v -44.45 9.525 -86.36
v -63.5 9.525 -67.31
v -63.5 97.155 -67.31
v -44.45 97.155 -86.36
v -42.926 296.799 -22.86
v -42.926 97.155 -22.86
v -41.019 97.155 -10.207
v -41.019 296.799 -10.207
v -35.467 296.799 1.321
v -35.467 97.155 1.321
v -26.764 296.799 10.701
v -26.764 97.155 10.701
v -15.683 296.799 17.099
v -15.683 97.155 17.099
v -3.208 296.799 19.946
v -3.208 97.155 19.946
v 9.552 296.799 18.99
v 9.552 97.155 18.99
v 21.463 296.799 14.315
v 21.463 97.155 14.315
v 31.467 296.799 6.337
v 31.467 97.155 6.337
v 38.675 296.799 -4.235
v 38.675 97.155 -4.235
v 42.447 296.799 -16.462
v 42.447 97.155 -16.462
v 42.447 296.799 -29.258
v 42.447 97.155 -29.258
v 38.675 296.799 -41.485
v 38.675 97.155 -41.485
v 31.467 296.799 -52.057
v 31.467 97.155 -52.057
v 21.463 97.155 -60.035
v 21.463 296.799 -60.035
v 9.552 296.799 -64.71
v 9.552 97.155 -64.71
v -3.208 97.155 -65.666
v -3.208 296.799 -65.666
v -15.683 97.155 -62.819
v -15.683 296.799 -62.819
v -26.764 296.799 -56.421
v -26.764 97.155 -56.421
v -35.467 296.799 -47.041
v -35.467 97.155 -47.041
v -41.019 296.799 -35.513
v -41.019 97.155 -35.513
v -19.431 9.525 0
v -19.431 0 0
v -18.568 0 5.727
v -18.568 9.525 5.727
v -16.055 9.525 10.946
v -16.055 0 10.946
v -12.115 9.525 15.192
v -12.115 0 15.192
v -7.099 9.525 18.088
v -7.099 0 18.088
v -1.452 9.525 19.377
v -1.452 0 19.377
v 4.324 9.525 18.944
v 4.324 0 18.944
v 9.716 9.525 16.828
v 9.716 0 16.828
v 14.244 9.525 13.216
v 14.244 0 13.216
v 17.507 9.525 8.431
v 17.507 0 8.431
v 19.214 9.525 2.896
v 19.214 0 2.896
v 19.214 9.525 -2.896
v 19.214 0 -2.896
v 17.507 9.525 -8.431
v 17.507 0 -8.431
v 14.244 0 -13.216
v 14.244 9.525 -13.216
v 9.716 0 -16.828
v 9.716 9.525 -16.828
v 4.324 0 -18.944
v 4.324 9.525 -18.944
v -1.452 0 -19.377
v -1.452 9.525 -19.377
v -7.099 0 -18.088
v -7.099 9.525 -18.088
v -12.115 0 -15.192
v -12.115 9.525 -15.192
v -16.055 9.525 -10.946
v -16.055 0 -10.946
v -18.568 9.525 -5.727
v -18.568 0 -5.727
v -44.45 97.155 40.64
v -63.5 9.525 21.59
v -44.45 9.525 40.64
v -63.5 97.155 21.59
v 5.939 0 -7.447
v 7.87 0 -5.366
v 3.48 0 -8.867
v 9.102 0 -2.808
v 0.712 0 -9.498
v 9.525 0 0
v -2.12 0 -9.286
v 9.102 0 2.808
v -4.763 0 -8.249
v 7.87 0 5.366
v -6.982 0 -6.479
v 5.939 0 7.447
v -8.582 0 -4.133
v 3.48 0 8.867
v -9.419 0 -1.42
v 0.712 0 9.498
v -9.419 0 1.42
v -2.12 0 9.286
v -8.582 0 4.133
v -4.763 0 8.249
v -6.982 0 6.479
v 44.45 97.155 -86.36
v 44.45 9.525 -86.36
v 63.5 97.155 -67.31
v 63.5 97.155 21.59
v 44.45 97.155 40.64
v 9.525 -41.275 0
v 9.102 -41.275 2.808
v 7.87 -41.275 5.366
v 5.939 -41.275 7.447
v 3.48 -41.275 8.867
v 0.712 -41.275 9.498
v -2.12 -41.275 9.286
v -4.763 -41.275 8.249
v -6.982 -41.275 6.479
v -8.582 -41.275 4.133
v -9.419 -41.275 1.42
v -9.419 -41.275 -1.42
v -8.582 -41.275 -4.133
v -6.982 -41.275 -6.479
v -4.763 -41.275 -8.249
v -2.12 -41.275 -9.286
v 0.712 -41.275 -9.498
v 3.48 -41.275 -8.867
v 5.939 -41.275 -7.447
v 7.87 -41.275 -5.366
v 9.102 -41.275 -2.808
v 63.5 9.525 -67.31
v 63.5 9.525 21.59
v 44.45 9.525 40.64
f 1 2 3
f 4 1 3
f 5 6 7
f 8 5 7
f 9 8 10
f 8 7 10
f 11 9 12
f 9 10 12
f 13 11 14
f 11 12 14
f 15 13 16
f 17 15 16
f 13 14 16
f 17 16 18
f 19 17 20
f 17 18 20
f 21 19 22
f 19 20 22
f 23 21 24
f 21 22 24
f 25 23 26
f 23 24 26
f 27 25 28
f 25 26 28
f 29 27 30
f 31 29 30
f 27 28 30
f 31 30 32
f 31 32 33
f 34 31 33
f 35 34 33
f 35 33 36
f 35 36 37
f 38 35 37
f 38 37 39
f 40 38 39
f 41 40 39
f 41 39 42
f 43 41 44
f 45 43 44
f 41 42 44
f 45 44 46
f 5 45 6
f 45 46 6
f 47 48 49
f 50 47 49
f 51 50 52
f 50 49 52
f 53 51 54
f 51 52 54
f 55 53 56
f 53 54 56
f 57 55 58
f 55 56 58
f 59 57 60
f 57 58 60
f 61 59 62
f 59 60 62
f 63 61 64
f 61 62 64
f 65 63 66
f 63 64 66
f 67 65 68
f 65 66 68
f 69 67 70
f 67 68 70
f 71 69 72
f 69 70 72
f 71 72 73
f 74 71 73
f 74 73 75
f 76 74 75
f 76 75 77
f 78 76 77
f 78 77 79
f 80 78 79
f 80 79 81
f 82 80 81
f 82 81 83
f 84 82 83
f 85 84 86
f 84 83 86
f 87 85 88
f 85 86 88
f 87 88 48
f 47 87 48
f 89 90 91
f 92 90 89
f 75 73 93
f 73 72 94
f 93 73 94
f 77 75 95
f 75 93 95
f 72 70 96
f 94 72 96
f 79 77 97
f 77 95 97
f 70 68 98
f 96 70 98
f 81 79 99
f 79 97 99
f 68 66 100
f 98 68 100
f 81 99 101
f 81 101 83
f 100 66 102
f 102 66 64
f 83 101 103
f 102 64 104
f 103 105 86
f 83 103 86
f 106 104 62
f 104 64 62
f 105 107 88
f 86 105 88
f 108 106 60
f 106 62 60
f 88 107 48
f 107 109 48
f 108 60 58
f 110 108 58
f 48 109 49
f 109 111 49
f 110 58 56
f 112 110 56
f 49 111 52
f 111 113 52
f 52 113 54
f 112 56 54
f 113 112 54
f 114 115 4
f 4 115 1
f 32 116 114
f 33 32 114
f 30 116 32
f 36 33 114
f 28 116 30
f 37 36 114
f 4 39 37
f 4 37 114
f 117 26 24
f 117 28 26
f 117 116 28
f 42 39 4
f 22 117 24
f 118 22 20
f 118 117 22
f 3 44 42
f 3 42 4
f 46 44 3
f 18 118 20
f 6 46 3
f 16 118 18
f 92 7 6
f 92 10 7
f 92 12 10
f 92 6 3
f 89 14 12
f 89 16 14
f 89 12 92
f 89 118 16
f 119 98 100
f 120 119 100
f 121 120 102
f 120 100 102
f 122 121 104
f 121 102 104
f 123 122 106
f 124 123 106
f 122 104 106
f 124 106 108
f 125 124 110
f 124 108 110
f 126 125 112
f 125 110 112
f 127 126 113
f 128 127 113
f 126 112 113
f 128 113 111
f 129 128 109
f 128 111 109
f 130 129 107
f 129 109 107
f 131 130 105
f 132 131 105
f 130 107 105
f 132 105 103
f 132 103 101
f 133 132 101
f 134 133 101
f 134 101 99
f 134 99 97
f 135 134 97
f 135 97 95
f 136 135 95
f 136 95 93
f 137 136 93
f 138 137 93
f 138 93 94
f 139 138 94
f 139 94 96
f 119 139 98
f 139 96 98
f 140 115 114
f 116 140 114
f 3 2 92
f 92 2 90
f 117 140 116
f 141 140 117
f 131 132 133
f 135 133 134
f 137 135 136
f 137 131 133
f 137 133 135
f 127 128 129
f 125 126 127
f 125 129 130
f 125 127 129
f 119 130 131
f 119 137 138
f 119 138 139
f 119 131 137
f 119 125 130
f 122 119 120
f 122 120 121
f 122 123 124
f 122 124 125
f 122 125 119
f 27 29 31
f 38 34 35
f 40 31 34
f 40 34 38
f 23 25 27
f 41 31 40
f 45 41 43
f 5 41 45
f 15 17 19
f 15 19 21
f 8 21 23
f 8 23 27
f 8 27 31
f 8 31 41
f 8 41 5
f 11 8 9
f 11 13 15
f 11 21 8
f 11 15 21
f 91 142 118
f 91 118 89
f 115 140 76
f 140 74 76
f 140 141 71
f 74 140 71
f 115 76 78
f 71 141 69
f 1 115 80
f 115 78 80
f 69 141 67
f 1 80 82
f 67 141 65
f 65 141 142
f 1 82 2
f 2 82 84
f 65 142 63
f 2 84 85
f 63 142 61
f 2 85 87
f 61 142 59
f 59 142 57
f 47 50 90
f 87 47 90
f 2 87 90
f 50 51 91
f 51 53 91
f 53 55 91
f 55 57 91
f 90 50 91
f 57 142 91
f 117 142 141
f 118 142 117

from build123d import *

# Parameters (mm, degrees)
F0_R     = 9.525
F1_DEPTH = 41.275
F2_R     = 19.431
F3_DEPTH = 9.525
F4_W     = 127
F4_H     = 127
F5_DEPTH = 87.63
F6_SIZE  = 19.05
F7_R     = 42.926
F8_DEPTH = 199.644


with BuildPart() as f1:
    # F0 (on Front) → F1 (new body)
    with BuildSketch(Plane.XZ):
        Circle(F0_R)
    extrude(amount=F1_DEPTH)

    # F2 (on face) → F3 (join)
    with BuildSketch(Plane(origin=(0, 0, 0), x_dir=(-1, 0, 0), z_dir=(0, 1, 0))):
        Circle(F2_R)
    extrude(amount=F3_DEPTH)

    # F4 (on face) → F5 (join)
    with BuildSketch(Plane(origin=(0, 9.525, 0), x_dir=(-1, 0, 0), z_dir=(0, 1, 0))):
        with Locations((0, -22.86)):
            Rectangle(F4_W, F4_H)
    extrude(amount=F5_DEPTH)

    # F6
    f6_edges = [f1.edges().sort_by_distance(p)[0] for p in [
        (63.5, 53.34, 40.64),
        (-63.5, 53.34, 40.64),
        (63.5, 53.34, -86.36),
        (-63.5, 53.34, -86.36),
    ]]
    chamfer(f6_edges, length=F6_SIZE)

    # F7 (on face) → F8 (join)
    with BuildSketch(Plane(origin=(0, 97.155, 0), x_dir=(-1, 0, 0), z_dir=(0, 1, 0))):
        with Locations((0, -22.86)):
            Circle(F7_R)
    extrude(amount=F8_DEPTH)


solid = f1.part
